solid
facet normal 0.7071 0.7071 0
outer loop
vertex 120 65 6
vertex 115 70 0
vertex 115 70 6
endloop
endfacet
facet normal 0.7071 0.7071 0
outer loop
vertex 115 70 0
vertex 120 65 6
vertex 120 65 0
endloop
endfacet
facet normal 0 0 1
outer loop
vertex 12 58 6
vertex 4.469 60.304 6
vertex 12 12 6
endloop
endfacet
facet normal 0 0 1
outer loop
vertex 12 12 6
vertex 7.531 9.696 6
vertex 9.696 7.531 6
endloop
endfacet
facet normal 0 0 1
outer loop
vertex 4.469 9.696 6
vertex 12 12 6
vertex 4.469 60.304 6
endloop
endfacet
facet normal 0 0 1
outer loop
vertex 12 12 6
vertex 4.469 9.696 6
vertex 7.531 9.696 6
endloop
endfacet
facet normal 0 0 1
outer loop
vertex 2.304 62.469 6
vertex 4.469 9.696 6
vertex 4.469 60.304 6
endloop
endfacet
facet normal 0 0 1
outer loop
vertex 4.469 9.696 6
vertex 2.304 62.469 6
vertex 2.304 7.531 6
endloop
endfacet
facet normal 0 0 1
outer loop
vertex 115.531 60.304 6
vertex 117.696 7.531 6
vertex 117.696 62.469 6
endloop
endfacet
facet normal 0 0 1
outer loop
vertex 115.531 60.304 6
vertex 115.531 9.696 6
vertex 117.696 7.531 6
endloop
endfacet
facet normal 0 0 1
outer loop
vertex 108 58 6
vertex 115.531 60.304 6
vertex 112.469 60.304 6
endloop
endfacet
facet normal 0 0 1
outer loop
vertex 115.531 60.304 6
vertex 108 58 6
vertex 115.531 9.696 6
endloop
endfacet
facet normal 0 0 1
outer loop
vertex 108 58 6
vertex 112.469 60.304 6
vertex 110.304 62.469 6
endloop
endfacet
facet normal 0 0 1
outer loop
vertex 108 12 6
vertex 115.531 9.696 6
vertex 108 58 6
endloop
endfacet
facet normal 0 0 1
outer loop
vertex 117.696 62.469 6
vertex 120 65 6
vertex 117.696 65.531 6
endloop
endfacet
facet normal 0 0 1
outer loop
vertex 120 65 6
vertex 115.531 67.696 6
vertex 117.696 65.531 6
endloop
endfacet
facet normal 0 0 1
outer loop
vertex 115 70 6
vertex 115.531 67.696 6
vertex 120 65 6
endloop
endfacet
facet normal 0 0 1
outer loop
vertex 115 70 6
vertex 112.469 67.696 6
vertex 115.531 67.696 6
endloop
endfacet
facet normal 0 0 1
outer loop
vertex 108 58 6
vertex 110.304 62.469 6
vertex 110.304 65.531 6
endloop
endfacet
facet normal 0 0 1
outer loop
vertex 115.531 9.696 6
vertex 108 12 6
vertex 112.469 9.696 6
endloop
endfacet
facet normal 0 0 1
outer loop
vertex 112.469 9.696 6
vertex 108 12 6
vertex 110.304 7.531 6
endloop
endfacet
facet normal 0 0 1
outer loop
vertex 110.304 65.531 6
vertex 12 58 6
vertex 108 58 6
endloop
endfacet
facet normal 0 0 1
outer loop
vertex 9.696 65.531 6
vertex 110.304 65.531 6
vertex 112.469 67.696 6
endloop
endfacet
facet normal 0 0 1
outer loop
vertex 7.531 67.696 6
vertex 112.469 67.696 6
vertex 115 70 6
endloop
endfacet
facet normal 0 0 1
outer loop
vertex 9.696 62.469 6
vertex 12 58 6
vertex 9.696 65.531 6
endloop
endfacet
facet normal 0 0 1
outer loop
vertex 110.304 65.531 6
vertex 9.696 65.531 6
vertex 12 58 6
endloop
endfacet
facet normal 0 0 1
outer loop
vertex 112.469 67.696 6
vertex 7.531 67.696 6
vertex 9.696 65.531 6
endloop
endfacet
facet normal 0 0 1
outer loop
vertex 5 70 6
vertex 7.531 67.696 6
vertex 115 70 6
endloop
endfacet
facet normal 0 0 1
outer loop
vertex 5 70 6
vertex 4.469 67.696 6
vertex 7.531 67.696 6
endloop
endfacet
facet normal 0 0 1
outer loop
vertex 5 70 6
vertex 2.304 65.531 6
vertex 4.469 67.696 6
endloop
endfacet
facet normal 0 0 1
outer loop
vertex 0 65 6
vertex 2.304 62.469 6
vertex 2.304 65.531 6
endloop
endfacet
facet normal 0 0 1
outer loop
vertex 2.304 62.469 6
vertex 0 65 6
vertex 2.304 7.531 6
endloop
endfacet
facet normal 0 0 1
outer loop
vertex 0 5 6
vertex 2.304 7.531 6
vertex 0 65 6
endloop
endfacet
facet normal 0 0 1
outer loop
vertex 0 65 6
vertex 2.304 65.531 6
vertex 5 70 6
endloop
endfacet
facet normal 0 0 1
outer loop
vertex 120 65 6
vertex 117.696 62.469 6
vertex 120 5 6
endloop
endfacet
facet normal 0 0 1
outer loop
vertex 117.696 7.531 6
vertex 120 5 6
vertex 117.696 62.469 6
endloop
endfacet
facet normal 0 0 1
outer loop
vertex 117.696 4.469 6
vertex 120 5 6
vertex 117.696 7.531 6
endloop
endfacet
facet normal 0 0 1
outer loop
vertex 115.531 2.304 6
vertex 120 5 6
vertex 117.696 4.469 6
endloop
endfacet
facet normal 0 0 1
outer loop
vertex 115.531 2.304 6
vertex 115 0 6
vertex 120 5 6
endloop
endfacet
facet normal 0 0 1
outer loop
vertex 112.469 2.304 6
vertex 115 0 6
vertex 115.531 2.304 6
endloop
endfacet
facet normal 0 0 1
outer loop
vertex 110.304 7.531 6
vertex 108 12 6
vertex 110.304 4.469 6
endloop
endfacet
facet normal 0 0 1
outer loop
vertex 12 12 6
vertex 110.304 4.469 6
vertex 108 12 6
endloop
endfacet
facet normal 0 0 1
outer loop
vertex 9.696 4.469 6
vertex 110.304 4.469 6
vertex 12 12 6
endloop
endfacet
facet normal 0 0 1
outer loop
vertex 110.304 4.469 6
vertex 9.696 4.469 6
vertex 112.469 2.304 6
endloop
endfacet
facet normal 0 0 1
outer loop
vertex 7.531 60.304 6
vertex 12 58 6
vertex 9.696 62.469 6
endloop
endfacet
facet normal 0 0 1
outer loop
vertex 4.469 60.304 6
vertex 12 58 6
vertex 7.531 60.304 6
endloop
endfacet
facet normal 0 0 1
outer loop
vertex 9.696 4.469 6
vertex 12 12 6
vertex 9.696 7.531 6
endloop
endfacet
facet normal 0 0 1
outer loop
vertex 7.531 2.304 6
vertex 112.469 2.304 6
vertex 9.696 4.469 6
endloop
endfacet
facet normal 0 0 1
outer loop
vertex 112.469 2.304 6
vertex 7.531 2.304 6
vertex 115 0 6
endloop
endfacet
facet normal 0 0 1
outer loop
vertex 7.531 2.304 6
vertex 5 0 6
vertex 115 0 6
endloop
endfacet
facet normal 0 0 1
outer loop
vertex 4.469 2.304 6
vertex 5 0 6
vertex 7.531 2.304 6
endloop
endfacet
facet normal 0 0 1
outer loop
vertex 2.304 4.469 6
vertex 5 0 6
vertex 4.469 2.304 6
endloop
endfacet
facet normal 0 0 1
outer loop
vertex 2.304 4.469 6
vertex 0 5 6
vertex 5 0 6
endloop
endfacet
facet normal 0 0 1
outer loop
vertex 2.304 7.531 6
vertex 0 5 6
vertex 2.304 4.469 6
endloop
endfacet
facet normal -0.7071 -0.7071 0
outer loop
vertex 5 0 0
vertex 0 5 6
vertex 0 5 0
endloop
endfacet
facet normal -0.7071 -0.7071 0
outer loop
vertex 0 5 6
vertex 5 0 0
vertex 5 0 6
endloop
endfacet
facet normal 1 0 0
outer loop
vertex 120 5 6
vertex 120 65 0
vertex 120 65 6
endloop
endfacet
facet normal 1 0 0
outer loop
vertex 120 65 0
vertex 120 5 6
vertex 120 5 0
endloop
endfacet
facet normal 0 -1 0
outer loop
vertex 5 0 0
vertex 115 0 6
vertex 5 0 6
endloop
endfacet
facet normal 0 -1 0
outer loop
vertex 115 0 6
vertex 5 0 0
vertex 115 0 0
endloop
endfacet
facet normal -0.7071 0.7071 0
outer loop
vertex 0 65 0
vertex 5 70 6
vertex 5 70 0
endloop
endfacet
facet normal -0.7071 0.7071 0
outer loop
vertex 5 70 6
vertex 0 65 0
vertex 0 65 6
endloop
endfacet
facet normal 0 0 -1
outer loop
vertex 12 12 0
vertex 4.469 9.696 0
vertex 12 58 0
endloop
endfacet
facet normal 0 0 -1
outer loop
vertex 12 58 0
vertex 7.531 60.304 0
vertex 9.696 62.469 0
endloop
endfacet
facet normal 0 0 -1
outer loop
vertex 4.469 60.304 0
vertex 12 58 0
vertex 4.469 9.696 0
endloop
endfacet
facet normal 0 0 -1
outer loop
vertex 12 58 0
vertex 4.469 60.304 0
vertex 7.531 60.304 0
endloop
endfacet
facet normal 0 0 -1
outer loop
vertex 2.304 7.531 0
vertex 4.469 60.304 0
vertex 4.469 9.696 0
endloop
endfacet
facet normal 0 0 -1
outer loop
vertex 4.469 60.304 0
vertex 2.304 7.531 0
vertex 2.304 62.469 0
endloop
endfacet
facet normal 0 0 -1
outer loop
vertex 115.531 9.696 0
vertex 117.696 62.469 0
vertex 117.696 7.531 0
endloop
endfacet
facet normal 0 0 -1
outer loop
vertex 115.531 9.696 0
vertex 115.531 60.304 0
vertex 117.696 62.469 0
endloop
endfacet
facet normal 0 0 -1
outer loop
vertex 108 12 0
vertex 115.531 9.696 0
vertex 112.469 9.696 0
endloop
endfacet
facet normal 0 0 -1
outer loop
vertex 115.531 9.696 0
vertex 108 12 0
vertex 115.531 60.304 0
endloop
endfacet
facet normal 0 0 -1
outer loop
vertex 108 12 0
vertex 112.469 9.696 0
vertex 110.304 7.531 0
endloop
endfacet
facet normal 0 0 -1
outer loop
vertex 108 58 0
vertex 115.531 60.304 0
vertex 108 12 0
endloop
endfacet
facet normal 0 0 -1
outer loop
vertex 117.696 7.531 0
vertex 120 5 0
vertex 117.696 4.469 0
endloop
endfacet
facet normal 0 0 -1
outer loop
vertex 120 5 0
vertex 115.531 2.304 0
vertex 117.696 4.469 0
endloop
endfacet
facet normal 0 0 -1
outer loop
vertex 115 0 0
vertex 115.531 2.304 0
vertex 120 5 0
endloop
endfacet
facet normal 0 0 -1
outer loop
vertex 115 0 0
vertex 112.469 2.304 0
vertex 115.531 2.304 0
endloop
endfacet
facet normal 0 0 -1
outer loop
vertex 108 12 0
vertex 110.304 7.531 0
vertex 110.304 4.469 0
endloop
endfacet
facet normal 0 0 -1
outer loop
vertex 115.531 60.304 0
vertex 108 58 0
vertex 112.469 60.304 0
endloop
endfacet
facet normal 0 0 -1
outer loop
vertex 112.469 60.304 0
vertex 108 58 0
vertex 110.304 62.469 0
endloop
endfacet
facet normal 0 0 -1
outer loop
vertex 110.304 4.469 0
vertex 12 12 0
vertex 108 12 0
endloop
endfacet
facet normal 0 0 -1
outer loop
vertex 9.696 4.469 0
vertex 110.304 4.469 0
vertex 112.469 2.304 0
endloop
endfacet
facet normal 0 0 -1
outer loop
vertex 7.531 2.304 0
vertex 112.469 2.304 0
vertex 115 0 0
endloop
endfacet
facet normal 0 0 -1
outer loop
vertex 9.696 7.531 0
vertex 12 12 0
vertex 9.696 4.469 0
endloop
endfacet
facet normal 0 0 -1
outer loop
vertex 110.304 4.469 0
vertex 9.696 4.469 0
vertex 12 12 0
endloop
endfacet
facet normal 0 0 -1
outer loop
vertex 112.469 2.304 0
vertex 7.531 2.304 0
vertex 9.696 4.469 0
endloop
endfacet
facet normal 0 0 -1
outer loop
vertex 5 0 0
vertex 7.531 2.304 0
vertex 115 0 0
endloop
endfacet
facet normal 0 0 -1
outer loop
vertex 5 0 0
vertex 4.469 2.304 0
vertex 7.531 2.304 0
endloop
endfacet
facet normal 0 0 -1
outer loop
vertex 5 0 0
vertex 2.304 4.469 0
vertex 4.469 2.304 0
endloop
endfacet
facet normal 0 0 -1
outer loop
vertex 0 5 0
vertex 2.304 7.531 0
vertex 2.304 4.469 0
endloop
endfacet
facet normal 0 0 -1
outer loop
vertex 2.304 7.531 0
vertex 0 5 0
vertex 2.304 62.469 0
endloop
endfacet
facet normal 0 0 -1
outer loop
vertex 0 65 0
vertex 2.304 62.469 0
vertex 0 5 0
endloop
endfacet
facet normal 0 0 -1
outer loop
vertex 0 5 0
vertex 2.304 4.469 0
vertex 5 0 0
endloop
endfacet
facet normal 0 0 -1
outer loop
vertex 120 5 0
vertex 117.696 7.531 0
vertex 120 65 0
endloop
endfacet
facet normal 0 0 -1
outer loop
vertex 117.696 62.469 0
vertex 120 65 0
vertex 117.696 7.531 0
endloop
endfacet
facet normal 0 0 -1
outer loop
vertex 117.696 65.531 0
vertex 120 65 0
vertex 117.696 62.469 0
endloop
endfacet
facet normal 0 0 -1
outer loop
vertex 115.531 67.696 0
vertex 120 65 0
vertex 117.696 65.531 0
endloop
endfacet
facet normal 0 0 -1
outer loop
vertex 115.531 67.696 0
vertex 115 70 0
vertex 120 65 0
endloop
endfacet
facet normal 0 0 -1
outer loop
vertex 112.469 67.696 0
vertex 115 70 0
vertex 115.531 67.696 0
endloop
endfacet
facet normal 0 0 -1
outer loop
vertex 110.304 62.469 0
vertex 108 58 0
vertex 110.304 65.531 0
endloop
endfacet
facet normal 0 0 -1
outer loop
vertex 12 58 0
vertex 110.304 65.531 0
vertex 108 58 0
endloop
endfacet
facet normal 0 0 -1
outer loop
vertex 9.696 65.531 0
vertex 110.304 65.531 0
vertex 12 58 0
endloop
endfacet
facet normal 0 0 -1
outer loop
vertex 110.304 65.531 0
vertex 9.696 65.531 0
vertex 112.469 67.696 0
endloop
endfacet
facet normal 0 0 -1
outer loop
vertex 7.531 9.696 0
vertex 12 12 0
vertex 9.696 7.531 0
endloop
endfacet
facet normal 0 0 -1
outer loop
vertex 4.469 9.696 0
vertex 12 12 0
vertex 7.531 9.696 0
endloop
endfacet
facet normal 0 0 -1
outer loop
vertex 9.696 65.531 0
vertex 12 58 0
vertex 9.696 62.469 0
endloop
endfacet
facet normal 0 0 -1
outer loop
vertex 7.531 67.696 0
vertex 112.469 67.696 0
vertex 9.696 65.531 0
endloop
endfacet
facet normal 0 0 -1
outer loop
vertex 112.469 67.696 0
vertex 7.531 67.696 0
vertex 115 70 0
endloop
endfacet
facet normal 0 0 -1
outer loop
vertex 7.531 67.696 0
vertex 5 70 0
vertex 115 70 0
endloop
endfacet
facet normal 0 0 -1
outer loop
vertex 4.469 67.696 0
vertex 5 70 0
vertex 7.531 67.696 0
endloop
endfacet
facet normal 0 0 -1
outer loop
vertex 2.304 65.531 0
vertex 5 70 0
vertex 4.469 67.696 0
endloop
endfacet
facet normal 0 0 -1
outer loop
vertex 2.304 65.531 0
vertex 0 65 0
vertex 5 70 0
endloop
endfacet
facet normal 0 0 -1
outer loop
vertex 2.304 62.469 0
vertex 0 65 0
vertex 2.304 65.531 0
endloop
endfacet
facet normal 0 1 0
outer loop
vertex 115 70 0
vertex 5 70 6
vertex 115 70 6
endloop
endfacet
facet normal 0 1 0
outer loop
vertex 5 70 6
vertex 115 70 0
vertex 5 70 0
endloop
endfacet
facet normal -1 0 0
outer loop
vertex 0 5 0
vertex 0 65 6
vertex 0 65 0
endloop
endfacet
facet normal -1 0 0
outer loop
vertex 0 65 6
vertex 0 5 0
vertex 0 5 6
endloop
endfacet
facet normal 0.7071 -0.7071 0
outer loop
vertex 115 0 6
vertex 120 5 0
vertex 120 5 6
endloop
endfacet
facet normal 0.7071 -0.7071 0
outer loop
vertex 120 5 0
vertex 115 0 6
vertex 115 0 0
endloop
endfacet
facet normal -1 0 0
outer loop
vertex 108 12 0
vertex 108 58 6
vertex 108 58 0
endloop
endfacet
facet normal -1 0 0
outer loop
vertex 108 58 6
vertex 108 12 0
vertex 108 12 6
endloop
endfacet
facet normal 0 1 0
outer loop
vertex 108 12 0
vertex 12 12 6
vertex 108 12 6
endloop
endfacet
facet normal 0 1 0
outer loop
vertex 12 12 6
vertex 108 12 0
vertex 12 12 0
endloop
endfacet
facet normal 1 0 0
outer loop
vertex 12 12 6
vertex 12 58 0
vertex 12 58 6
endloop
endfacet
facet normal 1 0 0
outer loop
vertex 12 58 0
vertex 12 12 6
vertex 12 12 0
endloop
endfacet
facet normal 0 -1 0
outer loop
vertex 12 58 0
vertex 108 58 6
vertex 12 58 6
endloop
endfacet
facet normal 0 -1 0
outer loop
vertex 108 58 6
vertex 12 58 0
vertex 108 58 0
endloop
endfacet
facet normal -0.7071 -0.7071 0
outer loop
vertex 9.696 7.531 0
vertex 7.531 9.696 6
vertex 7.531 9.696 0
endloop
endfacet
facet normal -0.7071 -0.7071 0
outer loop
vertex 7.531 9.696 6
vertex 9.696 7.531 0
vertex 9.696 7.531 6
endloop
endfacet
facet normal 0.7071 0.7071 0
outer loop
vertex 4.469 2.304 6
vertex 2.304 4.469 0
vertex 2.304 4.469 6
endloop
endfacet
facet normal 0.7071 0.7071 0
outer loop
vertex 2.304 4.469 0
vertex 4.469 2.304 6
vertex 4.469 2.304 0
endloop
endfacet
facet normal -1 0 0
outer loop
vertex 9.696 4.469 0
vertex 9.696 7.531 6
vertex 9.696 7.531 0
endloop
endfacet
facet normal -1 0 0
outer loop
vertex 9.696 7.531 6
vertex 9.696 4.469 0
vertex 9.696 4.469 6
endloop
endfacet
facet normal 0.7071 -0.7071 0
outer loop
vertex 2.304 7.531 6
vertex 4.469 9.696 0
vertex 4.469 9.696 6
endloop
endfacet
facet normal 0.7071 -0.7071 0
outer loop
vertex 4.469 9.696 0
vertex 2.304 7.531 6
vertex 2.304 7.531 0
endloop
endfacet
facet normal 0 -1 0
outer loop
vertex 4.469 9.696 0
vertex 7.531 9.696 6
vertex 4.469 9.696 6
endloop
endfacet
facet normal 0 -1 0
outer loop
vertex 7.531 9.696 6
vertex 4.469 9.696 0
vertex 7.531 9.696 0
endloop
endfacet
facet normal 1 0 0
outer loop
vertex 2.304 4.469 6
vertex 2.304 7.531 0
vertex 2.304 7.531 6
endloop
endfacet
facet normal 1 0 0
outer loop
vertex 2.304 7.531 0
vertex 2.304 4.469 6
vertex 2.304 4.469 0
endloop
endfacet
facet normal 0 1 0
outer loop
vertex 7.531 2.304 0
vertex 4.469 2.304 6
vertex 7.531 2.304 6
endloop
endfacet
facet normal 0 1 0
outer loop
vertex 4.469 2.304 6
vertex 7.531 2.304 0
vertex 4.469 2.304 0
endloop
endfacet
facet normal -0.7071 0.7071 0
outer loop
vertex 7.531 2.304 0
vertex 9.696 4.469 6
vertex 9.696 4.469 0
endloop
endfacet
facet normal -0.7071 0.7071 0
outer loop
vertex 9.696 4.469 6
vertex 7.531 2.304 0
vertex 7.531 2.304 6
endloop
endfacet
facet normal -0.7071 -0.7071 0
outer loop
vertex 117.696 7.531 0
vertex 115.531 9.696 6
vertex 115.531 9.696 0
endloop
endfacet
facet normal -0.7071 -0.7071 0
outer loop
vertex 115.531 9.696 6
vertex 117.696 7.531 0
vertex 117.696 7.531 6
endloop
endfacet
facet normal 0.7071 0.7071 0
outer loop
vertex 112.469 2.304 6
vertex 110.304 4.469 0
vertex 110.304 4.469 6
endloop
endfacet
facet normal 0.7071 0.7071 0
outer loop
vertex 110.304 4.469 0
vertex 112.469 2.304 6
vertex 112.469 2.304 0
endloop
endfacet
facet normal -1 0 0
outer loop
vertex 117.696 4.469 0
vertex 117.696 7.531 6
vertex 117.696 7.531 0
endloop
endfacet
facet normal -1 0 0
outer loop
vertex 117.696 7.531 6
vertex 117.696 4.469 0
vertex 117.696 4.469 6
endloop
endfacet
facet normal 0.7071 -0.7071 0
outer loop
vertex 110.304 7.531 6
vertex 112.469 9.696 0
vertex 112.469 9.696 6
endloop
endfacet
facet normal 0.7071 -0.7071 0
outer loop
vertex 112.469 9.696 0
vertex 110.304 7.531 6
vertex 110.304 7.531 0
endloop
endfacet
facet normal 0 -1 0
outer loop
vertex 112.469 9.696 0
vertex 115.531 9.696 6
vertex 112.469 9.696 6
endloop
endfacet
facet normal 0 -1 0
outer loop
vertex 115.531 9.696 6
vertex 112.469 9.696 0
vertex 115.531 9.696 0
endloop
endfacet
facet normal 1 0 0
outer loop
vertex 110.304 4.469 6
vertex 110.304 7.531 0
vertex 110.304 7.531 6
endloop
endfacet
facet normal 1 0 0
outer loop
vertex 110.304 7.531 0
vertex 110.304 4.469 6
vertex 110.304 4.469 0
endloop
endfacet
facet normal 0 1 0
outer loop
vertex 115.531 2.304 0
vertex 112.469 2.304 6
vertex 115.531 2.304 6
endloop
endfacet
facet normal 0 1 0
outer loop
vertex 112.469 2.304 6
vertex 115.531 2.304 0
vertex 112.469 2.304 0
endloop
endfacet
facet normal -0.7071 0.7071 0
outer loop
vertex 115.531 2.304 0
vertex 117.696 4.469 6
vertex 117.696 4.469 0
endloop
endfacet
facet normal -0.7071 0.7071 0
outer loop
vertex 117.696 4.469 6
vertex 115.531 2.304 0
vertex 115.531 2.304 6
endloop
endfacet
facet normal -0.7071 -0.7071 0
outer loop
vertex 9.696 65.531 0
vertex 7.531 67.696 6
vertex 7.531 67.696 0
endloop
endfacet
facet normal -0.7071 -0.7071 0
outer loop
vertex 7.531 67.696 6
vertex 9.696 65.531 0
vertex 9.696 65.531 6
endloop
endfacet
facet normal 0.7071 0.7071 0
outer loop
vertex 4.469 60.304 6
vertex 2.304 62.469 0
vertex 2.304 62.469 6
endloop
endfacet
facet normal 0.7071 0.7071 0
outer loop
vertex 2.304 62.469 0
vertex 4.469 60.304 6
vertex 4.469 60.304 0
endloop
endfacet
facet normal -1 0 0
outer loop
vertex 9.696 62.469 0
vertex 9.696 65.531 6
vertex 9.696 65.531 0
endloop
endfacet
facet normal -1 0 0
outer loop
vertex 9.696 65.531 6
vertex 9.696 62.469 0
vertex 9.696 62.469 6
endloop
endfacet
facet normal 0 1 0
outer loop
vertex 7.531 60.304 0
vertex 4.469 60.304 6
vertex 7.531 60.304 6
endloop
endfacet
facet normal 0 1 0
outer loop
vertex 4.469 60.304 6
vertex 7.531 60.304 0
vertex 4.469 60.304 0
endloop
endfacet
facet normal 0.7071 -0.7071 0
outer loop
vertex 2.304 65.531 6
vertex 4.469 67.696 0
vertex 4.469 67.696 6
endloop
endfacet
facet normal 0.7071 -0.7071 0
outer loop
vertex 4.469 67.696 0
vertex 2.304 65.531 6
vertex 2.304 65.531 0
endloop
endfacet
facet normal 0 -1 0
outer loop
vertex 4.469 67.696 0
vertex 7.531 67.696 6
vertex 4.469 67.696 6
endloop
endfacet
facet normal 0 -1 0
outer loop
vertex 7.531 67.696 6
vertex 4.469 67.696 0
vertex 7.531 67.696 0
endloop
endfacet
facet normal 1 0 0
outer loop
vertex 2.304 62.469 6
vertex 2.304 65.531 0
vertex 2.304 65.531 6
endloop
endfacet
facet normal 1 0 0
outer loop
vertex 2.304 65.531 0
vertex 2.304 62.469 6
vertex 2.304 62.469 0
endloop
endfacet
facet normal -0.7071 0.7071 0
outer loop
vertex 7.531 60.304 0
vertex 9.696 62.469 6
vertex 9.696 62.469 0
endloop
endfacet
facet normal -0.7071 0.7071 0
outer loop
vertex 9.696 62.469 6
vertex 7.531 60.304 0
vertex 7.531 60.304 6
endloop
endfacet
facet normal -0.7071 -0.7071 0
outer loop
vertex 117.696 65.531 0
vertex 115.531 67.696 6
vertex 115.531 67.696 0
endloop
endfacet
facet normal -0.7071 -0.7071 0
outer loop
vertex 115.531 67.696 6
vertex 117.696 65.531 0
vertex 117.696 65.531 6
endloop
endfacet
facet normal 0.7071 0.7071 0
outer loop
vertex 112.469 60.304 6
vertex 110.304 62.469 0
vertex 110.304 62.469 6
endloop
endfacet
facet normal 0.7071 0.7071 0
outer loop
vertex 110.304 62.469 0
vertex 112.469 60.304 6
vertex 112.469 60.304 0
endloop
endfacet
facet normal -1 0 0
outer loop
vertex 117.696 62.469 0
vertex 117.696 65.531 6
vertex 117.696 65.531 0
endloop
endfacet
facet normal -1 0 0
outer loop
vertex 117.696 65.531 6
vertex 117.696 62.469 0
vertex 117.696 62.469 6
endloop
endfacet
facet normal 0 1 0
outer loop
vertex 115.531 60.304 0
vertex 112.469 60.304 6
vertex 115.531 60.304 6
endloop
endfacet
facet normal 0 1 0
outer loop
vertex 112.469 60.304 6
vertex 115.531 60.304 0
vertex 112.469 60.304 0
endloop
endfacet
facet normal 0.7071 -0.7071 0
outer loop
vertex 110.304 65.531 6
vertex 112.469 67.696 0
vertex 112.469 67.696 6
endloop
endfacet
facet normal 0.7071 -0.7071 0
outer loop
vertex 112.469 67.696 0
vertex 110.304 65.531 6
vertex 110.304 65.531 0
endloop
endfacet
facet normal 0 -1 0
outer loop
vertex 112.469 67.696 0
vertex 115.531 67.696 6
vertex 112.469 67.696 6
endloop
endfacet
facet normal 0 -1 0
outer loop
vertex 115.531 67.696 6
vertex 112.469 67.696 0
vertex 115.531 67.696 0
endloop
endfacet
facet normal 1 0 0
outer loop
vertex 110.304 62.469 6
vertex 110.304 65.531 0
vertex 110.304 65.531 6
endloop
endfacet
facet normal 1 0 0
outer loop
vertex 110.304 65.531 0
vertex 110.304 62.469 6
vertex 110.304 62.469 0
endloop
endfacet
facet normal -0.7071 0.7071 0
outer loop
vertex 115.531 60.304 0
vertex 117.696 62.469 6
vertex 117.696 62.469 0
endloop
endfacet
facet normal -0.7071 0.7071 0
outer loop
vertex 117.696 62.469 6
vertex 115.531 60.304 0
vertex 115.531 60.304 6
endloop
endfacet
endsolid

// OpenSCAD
$fn = 32;

// ----------------------------------------------------------------------
// Frame plate: 120 x 70 frame, 12 mm rails
// ----------------------------------------------------------------------

// --- parameters (mm) ---
plate_l = 120;            // plate length, X
plate_w = 70;             // plate width, Y
plate_t = 6;              // plate thickness, Z (extrusion height)
corner_c = 5;             // corner chamfer
frame_bar = 12;           // frame rail width
bolt_r = 4;               // corner bolt window radius
bolt_inset = 6;           // bolt centre inset from the edges

win_l = plate_l - 2 * frame_bar;  // window length
win_w = plate_w - 2 * frame_bar;  // window width
bolt_d = 2 * bolt_r;  // corner hole diameter

profile = [[5, 0], [115, 0], [120, 5], [120, 65], [115, 70], [5, 70], [0, 65], [0, 5]];  // primary outline, 8 points, counter clockwise
void_1 = [[12, 12], [108, 12], [108, 58], [12, 58]];  // the window, 4 points
void_2 = [[9.696, 7.531], [7.531, 9.696], [4.469, 9.696], [2.304, 7.531], [2.304, 4.469], [4.469, 2.304], [7.531, 2.304], [9.696, 4.469]];  // corner bolt window, 8 points
void_3 = [[117.696, 7.531], [115.531, 9.696], [112.469, 9.696], [110.304, 7.531], [110.304, 4.469], [112.469, 2.304], [115.531, 2.304], [117.696, 4.469]];  // corner bolt window, 8 points
void_4 = [[9.696, 65.531], [7.531, 67.696], [4.469, 67.696], [2.304, 65.531], [2.304, 62.469], [4.469, 60.304], [7.531, 60.304], [9.696, 62.469]];  // corner bolt window, 8 points
void_5 = [[117.696, 65.531], [115.531, 67.696], [112.469, 67.696], [110.304, 65.531], [110.304, 62.469], [112.469, 60.304], [115.531, 60.304], [117.696, 62.469]];  // corner bolt window, 8 points

// --- the one profile operation ---
difference() {
  linear_extrude(height = plate_t) polygon(points = profile);
  translate([0, 0, -1])
    linear_extrude(height = plate_t + 2) polygon(points = void_1);
  translate([0, 0, -1])
    linear_extrude(height = plate_t + 2) polygon(points = void_2);
  translate([0, 0, -1])
    linear_extrude(height = plate_t + 2) polygon(points = void_3);
  translate([0, 0, -1])
    linear_extrude(height = plate_t + 2) polygon(points = void_4);
  translate([0, 0, -1])
    linear_extrude(height = plate_t + 2) polygon(points = void_5);
}
